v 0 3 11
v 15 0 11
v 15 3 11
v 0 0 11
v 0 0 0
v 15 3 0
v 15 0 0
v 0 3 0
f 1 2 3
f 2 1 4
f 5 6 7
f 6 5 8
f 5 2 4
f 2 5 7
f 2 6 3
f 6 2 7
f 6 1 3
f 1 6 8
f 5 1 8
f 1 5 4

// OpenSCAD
// Generated by SolidPython 1.0.1 on 2020-07-29 00:46:55


cube(size = [15, 3, 11]);
/***********************************************
*********      SolidPython code:      **********
************************************************
 
# import packages: SolidPython
from solid import *
from solid.utils import *
from itertools import chain, combinations, permutations


class Resize:

    def __init__(self, scad_file):
        self.scad_file = scad_file
        #self.scad_file = import_scad(scad_file)
        # cone/cylinder param:
        self.r1 = 0
        self.r2 = 0
        self.h = 0
        # rectangular prism param:
        self.w = 0
        self.l = 0
        # ellipse param:
        self.r = 0

    # import OpenScad code (file name corresponds to shape)


    # classify shape + parameters
    def assign(self, param1, param2, param3):
        if self.scad_file == 'cone.scad':
            self.r1 = param1
            self.r2 = param2
            self.h = param3
        elif self.scad_file == 'cylinder.scad':
            self.r1 = param1
            self.r2 = param2
            self.h = param3
        elif self.scad_file == 'rectangularPrism.scad':
            self.h = param1
            self.l = param2
            self.w = param3
        else:
            self.r = param1
            self.h = param2

    # resize parameters
    def iterate(self):
        x = range(3, 20, 2)
        i = 1
        if self.scad_file == 'cone.scad':
            tempList = list(permutations(x, 2))
            for temp in tempList:
                param1 = temp[0]
                param2 = temp[1]
                filepath = 'produced_scad_files/' + 'cone' + str(param1) + '_' + str(param2) + '_' + '.scad'
                scad_render_to_file(cylinder(h=param1, r1=param2, r2=0), filepath)

        elif self.scad_file == 'cylinder.scad':
            tempList = list(permutations(x, 3))
            for temp in tempList:
                param1 = temp[0]
                param2 = temp[1]
                filepath = 'produced_scad_files/' + 'cylinder' + str(param1) + '_' + str(param2) + '_' + '.scad'
                scad_render_to_file(cylinder(h=param1, r1=param2, r2=param2), filepath)

        elif self.scad_file == 'rectangularPrism.scad':
            tempList = list(permutations(x, 3))
            for temp in tempList:
                param1 = temp[0]
                param2 = temp[1]
                param3 = temp[2]
                filepath = 'produced_scad_files/' + 'rectangularPrism' + str(param1) + '_' + str(param2) + '_' + str(
                    param3) + '.scad'
                scad_render_to_file(cube(size=(param1, param2, param3)), filepath)

        elif self.scad_file == 'ellipse.scad':
            tempList = list(permutations(x, 4))
            for temp in tempList:
                param1 = temp[0]
                param2 = temp[1]
                param3 = temp[2]
                param4 = temp[3]
                filepath = 'produced_scad_files/' + 'ellipse' + str(param1) + '_' + str(param2) + '_' + str(param3) + '_' + str(param4) + '.scad'
                scad_render_to_file(scale([param1, param2, param3])(sphere(r=param4)), filepath)

    def render_to_scadfile(self):
        scad_render_to_file(scad, 'example.scad') 
 
************************************************/
